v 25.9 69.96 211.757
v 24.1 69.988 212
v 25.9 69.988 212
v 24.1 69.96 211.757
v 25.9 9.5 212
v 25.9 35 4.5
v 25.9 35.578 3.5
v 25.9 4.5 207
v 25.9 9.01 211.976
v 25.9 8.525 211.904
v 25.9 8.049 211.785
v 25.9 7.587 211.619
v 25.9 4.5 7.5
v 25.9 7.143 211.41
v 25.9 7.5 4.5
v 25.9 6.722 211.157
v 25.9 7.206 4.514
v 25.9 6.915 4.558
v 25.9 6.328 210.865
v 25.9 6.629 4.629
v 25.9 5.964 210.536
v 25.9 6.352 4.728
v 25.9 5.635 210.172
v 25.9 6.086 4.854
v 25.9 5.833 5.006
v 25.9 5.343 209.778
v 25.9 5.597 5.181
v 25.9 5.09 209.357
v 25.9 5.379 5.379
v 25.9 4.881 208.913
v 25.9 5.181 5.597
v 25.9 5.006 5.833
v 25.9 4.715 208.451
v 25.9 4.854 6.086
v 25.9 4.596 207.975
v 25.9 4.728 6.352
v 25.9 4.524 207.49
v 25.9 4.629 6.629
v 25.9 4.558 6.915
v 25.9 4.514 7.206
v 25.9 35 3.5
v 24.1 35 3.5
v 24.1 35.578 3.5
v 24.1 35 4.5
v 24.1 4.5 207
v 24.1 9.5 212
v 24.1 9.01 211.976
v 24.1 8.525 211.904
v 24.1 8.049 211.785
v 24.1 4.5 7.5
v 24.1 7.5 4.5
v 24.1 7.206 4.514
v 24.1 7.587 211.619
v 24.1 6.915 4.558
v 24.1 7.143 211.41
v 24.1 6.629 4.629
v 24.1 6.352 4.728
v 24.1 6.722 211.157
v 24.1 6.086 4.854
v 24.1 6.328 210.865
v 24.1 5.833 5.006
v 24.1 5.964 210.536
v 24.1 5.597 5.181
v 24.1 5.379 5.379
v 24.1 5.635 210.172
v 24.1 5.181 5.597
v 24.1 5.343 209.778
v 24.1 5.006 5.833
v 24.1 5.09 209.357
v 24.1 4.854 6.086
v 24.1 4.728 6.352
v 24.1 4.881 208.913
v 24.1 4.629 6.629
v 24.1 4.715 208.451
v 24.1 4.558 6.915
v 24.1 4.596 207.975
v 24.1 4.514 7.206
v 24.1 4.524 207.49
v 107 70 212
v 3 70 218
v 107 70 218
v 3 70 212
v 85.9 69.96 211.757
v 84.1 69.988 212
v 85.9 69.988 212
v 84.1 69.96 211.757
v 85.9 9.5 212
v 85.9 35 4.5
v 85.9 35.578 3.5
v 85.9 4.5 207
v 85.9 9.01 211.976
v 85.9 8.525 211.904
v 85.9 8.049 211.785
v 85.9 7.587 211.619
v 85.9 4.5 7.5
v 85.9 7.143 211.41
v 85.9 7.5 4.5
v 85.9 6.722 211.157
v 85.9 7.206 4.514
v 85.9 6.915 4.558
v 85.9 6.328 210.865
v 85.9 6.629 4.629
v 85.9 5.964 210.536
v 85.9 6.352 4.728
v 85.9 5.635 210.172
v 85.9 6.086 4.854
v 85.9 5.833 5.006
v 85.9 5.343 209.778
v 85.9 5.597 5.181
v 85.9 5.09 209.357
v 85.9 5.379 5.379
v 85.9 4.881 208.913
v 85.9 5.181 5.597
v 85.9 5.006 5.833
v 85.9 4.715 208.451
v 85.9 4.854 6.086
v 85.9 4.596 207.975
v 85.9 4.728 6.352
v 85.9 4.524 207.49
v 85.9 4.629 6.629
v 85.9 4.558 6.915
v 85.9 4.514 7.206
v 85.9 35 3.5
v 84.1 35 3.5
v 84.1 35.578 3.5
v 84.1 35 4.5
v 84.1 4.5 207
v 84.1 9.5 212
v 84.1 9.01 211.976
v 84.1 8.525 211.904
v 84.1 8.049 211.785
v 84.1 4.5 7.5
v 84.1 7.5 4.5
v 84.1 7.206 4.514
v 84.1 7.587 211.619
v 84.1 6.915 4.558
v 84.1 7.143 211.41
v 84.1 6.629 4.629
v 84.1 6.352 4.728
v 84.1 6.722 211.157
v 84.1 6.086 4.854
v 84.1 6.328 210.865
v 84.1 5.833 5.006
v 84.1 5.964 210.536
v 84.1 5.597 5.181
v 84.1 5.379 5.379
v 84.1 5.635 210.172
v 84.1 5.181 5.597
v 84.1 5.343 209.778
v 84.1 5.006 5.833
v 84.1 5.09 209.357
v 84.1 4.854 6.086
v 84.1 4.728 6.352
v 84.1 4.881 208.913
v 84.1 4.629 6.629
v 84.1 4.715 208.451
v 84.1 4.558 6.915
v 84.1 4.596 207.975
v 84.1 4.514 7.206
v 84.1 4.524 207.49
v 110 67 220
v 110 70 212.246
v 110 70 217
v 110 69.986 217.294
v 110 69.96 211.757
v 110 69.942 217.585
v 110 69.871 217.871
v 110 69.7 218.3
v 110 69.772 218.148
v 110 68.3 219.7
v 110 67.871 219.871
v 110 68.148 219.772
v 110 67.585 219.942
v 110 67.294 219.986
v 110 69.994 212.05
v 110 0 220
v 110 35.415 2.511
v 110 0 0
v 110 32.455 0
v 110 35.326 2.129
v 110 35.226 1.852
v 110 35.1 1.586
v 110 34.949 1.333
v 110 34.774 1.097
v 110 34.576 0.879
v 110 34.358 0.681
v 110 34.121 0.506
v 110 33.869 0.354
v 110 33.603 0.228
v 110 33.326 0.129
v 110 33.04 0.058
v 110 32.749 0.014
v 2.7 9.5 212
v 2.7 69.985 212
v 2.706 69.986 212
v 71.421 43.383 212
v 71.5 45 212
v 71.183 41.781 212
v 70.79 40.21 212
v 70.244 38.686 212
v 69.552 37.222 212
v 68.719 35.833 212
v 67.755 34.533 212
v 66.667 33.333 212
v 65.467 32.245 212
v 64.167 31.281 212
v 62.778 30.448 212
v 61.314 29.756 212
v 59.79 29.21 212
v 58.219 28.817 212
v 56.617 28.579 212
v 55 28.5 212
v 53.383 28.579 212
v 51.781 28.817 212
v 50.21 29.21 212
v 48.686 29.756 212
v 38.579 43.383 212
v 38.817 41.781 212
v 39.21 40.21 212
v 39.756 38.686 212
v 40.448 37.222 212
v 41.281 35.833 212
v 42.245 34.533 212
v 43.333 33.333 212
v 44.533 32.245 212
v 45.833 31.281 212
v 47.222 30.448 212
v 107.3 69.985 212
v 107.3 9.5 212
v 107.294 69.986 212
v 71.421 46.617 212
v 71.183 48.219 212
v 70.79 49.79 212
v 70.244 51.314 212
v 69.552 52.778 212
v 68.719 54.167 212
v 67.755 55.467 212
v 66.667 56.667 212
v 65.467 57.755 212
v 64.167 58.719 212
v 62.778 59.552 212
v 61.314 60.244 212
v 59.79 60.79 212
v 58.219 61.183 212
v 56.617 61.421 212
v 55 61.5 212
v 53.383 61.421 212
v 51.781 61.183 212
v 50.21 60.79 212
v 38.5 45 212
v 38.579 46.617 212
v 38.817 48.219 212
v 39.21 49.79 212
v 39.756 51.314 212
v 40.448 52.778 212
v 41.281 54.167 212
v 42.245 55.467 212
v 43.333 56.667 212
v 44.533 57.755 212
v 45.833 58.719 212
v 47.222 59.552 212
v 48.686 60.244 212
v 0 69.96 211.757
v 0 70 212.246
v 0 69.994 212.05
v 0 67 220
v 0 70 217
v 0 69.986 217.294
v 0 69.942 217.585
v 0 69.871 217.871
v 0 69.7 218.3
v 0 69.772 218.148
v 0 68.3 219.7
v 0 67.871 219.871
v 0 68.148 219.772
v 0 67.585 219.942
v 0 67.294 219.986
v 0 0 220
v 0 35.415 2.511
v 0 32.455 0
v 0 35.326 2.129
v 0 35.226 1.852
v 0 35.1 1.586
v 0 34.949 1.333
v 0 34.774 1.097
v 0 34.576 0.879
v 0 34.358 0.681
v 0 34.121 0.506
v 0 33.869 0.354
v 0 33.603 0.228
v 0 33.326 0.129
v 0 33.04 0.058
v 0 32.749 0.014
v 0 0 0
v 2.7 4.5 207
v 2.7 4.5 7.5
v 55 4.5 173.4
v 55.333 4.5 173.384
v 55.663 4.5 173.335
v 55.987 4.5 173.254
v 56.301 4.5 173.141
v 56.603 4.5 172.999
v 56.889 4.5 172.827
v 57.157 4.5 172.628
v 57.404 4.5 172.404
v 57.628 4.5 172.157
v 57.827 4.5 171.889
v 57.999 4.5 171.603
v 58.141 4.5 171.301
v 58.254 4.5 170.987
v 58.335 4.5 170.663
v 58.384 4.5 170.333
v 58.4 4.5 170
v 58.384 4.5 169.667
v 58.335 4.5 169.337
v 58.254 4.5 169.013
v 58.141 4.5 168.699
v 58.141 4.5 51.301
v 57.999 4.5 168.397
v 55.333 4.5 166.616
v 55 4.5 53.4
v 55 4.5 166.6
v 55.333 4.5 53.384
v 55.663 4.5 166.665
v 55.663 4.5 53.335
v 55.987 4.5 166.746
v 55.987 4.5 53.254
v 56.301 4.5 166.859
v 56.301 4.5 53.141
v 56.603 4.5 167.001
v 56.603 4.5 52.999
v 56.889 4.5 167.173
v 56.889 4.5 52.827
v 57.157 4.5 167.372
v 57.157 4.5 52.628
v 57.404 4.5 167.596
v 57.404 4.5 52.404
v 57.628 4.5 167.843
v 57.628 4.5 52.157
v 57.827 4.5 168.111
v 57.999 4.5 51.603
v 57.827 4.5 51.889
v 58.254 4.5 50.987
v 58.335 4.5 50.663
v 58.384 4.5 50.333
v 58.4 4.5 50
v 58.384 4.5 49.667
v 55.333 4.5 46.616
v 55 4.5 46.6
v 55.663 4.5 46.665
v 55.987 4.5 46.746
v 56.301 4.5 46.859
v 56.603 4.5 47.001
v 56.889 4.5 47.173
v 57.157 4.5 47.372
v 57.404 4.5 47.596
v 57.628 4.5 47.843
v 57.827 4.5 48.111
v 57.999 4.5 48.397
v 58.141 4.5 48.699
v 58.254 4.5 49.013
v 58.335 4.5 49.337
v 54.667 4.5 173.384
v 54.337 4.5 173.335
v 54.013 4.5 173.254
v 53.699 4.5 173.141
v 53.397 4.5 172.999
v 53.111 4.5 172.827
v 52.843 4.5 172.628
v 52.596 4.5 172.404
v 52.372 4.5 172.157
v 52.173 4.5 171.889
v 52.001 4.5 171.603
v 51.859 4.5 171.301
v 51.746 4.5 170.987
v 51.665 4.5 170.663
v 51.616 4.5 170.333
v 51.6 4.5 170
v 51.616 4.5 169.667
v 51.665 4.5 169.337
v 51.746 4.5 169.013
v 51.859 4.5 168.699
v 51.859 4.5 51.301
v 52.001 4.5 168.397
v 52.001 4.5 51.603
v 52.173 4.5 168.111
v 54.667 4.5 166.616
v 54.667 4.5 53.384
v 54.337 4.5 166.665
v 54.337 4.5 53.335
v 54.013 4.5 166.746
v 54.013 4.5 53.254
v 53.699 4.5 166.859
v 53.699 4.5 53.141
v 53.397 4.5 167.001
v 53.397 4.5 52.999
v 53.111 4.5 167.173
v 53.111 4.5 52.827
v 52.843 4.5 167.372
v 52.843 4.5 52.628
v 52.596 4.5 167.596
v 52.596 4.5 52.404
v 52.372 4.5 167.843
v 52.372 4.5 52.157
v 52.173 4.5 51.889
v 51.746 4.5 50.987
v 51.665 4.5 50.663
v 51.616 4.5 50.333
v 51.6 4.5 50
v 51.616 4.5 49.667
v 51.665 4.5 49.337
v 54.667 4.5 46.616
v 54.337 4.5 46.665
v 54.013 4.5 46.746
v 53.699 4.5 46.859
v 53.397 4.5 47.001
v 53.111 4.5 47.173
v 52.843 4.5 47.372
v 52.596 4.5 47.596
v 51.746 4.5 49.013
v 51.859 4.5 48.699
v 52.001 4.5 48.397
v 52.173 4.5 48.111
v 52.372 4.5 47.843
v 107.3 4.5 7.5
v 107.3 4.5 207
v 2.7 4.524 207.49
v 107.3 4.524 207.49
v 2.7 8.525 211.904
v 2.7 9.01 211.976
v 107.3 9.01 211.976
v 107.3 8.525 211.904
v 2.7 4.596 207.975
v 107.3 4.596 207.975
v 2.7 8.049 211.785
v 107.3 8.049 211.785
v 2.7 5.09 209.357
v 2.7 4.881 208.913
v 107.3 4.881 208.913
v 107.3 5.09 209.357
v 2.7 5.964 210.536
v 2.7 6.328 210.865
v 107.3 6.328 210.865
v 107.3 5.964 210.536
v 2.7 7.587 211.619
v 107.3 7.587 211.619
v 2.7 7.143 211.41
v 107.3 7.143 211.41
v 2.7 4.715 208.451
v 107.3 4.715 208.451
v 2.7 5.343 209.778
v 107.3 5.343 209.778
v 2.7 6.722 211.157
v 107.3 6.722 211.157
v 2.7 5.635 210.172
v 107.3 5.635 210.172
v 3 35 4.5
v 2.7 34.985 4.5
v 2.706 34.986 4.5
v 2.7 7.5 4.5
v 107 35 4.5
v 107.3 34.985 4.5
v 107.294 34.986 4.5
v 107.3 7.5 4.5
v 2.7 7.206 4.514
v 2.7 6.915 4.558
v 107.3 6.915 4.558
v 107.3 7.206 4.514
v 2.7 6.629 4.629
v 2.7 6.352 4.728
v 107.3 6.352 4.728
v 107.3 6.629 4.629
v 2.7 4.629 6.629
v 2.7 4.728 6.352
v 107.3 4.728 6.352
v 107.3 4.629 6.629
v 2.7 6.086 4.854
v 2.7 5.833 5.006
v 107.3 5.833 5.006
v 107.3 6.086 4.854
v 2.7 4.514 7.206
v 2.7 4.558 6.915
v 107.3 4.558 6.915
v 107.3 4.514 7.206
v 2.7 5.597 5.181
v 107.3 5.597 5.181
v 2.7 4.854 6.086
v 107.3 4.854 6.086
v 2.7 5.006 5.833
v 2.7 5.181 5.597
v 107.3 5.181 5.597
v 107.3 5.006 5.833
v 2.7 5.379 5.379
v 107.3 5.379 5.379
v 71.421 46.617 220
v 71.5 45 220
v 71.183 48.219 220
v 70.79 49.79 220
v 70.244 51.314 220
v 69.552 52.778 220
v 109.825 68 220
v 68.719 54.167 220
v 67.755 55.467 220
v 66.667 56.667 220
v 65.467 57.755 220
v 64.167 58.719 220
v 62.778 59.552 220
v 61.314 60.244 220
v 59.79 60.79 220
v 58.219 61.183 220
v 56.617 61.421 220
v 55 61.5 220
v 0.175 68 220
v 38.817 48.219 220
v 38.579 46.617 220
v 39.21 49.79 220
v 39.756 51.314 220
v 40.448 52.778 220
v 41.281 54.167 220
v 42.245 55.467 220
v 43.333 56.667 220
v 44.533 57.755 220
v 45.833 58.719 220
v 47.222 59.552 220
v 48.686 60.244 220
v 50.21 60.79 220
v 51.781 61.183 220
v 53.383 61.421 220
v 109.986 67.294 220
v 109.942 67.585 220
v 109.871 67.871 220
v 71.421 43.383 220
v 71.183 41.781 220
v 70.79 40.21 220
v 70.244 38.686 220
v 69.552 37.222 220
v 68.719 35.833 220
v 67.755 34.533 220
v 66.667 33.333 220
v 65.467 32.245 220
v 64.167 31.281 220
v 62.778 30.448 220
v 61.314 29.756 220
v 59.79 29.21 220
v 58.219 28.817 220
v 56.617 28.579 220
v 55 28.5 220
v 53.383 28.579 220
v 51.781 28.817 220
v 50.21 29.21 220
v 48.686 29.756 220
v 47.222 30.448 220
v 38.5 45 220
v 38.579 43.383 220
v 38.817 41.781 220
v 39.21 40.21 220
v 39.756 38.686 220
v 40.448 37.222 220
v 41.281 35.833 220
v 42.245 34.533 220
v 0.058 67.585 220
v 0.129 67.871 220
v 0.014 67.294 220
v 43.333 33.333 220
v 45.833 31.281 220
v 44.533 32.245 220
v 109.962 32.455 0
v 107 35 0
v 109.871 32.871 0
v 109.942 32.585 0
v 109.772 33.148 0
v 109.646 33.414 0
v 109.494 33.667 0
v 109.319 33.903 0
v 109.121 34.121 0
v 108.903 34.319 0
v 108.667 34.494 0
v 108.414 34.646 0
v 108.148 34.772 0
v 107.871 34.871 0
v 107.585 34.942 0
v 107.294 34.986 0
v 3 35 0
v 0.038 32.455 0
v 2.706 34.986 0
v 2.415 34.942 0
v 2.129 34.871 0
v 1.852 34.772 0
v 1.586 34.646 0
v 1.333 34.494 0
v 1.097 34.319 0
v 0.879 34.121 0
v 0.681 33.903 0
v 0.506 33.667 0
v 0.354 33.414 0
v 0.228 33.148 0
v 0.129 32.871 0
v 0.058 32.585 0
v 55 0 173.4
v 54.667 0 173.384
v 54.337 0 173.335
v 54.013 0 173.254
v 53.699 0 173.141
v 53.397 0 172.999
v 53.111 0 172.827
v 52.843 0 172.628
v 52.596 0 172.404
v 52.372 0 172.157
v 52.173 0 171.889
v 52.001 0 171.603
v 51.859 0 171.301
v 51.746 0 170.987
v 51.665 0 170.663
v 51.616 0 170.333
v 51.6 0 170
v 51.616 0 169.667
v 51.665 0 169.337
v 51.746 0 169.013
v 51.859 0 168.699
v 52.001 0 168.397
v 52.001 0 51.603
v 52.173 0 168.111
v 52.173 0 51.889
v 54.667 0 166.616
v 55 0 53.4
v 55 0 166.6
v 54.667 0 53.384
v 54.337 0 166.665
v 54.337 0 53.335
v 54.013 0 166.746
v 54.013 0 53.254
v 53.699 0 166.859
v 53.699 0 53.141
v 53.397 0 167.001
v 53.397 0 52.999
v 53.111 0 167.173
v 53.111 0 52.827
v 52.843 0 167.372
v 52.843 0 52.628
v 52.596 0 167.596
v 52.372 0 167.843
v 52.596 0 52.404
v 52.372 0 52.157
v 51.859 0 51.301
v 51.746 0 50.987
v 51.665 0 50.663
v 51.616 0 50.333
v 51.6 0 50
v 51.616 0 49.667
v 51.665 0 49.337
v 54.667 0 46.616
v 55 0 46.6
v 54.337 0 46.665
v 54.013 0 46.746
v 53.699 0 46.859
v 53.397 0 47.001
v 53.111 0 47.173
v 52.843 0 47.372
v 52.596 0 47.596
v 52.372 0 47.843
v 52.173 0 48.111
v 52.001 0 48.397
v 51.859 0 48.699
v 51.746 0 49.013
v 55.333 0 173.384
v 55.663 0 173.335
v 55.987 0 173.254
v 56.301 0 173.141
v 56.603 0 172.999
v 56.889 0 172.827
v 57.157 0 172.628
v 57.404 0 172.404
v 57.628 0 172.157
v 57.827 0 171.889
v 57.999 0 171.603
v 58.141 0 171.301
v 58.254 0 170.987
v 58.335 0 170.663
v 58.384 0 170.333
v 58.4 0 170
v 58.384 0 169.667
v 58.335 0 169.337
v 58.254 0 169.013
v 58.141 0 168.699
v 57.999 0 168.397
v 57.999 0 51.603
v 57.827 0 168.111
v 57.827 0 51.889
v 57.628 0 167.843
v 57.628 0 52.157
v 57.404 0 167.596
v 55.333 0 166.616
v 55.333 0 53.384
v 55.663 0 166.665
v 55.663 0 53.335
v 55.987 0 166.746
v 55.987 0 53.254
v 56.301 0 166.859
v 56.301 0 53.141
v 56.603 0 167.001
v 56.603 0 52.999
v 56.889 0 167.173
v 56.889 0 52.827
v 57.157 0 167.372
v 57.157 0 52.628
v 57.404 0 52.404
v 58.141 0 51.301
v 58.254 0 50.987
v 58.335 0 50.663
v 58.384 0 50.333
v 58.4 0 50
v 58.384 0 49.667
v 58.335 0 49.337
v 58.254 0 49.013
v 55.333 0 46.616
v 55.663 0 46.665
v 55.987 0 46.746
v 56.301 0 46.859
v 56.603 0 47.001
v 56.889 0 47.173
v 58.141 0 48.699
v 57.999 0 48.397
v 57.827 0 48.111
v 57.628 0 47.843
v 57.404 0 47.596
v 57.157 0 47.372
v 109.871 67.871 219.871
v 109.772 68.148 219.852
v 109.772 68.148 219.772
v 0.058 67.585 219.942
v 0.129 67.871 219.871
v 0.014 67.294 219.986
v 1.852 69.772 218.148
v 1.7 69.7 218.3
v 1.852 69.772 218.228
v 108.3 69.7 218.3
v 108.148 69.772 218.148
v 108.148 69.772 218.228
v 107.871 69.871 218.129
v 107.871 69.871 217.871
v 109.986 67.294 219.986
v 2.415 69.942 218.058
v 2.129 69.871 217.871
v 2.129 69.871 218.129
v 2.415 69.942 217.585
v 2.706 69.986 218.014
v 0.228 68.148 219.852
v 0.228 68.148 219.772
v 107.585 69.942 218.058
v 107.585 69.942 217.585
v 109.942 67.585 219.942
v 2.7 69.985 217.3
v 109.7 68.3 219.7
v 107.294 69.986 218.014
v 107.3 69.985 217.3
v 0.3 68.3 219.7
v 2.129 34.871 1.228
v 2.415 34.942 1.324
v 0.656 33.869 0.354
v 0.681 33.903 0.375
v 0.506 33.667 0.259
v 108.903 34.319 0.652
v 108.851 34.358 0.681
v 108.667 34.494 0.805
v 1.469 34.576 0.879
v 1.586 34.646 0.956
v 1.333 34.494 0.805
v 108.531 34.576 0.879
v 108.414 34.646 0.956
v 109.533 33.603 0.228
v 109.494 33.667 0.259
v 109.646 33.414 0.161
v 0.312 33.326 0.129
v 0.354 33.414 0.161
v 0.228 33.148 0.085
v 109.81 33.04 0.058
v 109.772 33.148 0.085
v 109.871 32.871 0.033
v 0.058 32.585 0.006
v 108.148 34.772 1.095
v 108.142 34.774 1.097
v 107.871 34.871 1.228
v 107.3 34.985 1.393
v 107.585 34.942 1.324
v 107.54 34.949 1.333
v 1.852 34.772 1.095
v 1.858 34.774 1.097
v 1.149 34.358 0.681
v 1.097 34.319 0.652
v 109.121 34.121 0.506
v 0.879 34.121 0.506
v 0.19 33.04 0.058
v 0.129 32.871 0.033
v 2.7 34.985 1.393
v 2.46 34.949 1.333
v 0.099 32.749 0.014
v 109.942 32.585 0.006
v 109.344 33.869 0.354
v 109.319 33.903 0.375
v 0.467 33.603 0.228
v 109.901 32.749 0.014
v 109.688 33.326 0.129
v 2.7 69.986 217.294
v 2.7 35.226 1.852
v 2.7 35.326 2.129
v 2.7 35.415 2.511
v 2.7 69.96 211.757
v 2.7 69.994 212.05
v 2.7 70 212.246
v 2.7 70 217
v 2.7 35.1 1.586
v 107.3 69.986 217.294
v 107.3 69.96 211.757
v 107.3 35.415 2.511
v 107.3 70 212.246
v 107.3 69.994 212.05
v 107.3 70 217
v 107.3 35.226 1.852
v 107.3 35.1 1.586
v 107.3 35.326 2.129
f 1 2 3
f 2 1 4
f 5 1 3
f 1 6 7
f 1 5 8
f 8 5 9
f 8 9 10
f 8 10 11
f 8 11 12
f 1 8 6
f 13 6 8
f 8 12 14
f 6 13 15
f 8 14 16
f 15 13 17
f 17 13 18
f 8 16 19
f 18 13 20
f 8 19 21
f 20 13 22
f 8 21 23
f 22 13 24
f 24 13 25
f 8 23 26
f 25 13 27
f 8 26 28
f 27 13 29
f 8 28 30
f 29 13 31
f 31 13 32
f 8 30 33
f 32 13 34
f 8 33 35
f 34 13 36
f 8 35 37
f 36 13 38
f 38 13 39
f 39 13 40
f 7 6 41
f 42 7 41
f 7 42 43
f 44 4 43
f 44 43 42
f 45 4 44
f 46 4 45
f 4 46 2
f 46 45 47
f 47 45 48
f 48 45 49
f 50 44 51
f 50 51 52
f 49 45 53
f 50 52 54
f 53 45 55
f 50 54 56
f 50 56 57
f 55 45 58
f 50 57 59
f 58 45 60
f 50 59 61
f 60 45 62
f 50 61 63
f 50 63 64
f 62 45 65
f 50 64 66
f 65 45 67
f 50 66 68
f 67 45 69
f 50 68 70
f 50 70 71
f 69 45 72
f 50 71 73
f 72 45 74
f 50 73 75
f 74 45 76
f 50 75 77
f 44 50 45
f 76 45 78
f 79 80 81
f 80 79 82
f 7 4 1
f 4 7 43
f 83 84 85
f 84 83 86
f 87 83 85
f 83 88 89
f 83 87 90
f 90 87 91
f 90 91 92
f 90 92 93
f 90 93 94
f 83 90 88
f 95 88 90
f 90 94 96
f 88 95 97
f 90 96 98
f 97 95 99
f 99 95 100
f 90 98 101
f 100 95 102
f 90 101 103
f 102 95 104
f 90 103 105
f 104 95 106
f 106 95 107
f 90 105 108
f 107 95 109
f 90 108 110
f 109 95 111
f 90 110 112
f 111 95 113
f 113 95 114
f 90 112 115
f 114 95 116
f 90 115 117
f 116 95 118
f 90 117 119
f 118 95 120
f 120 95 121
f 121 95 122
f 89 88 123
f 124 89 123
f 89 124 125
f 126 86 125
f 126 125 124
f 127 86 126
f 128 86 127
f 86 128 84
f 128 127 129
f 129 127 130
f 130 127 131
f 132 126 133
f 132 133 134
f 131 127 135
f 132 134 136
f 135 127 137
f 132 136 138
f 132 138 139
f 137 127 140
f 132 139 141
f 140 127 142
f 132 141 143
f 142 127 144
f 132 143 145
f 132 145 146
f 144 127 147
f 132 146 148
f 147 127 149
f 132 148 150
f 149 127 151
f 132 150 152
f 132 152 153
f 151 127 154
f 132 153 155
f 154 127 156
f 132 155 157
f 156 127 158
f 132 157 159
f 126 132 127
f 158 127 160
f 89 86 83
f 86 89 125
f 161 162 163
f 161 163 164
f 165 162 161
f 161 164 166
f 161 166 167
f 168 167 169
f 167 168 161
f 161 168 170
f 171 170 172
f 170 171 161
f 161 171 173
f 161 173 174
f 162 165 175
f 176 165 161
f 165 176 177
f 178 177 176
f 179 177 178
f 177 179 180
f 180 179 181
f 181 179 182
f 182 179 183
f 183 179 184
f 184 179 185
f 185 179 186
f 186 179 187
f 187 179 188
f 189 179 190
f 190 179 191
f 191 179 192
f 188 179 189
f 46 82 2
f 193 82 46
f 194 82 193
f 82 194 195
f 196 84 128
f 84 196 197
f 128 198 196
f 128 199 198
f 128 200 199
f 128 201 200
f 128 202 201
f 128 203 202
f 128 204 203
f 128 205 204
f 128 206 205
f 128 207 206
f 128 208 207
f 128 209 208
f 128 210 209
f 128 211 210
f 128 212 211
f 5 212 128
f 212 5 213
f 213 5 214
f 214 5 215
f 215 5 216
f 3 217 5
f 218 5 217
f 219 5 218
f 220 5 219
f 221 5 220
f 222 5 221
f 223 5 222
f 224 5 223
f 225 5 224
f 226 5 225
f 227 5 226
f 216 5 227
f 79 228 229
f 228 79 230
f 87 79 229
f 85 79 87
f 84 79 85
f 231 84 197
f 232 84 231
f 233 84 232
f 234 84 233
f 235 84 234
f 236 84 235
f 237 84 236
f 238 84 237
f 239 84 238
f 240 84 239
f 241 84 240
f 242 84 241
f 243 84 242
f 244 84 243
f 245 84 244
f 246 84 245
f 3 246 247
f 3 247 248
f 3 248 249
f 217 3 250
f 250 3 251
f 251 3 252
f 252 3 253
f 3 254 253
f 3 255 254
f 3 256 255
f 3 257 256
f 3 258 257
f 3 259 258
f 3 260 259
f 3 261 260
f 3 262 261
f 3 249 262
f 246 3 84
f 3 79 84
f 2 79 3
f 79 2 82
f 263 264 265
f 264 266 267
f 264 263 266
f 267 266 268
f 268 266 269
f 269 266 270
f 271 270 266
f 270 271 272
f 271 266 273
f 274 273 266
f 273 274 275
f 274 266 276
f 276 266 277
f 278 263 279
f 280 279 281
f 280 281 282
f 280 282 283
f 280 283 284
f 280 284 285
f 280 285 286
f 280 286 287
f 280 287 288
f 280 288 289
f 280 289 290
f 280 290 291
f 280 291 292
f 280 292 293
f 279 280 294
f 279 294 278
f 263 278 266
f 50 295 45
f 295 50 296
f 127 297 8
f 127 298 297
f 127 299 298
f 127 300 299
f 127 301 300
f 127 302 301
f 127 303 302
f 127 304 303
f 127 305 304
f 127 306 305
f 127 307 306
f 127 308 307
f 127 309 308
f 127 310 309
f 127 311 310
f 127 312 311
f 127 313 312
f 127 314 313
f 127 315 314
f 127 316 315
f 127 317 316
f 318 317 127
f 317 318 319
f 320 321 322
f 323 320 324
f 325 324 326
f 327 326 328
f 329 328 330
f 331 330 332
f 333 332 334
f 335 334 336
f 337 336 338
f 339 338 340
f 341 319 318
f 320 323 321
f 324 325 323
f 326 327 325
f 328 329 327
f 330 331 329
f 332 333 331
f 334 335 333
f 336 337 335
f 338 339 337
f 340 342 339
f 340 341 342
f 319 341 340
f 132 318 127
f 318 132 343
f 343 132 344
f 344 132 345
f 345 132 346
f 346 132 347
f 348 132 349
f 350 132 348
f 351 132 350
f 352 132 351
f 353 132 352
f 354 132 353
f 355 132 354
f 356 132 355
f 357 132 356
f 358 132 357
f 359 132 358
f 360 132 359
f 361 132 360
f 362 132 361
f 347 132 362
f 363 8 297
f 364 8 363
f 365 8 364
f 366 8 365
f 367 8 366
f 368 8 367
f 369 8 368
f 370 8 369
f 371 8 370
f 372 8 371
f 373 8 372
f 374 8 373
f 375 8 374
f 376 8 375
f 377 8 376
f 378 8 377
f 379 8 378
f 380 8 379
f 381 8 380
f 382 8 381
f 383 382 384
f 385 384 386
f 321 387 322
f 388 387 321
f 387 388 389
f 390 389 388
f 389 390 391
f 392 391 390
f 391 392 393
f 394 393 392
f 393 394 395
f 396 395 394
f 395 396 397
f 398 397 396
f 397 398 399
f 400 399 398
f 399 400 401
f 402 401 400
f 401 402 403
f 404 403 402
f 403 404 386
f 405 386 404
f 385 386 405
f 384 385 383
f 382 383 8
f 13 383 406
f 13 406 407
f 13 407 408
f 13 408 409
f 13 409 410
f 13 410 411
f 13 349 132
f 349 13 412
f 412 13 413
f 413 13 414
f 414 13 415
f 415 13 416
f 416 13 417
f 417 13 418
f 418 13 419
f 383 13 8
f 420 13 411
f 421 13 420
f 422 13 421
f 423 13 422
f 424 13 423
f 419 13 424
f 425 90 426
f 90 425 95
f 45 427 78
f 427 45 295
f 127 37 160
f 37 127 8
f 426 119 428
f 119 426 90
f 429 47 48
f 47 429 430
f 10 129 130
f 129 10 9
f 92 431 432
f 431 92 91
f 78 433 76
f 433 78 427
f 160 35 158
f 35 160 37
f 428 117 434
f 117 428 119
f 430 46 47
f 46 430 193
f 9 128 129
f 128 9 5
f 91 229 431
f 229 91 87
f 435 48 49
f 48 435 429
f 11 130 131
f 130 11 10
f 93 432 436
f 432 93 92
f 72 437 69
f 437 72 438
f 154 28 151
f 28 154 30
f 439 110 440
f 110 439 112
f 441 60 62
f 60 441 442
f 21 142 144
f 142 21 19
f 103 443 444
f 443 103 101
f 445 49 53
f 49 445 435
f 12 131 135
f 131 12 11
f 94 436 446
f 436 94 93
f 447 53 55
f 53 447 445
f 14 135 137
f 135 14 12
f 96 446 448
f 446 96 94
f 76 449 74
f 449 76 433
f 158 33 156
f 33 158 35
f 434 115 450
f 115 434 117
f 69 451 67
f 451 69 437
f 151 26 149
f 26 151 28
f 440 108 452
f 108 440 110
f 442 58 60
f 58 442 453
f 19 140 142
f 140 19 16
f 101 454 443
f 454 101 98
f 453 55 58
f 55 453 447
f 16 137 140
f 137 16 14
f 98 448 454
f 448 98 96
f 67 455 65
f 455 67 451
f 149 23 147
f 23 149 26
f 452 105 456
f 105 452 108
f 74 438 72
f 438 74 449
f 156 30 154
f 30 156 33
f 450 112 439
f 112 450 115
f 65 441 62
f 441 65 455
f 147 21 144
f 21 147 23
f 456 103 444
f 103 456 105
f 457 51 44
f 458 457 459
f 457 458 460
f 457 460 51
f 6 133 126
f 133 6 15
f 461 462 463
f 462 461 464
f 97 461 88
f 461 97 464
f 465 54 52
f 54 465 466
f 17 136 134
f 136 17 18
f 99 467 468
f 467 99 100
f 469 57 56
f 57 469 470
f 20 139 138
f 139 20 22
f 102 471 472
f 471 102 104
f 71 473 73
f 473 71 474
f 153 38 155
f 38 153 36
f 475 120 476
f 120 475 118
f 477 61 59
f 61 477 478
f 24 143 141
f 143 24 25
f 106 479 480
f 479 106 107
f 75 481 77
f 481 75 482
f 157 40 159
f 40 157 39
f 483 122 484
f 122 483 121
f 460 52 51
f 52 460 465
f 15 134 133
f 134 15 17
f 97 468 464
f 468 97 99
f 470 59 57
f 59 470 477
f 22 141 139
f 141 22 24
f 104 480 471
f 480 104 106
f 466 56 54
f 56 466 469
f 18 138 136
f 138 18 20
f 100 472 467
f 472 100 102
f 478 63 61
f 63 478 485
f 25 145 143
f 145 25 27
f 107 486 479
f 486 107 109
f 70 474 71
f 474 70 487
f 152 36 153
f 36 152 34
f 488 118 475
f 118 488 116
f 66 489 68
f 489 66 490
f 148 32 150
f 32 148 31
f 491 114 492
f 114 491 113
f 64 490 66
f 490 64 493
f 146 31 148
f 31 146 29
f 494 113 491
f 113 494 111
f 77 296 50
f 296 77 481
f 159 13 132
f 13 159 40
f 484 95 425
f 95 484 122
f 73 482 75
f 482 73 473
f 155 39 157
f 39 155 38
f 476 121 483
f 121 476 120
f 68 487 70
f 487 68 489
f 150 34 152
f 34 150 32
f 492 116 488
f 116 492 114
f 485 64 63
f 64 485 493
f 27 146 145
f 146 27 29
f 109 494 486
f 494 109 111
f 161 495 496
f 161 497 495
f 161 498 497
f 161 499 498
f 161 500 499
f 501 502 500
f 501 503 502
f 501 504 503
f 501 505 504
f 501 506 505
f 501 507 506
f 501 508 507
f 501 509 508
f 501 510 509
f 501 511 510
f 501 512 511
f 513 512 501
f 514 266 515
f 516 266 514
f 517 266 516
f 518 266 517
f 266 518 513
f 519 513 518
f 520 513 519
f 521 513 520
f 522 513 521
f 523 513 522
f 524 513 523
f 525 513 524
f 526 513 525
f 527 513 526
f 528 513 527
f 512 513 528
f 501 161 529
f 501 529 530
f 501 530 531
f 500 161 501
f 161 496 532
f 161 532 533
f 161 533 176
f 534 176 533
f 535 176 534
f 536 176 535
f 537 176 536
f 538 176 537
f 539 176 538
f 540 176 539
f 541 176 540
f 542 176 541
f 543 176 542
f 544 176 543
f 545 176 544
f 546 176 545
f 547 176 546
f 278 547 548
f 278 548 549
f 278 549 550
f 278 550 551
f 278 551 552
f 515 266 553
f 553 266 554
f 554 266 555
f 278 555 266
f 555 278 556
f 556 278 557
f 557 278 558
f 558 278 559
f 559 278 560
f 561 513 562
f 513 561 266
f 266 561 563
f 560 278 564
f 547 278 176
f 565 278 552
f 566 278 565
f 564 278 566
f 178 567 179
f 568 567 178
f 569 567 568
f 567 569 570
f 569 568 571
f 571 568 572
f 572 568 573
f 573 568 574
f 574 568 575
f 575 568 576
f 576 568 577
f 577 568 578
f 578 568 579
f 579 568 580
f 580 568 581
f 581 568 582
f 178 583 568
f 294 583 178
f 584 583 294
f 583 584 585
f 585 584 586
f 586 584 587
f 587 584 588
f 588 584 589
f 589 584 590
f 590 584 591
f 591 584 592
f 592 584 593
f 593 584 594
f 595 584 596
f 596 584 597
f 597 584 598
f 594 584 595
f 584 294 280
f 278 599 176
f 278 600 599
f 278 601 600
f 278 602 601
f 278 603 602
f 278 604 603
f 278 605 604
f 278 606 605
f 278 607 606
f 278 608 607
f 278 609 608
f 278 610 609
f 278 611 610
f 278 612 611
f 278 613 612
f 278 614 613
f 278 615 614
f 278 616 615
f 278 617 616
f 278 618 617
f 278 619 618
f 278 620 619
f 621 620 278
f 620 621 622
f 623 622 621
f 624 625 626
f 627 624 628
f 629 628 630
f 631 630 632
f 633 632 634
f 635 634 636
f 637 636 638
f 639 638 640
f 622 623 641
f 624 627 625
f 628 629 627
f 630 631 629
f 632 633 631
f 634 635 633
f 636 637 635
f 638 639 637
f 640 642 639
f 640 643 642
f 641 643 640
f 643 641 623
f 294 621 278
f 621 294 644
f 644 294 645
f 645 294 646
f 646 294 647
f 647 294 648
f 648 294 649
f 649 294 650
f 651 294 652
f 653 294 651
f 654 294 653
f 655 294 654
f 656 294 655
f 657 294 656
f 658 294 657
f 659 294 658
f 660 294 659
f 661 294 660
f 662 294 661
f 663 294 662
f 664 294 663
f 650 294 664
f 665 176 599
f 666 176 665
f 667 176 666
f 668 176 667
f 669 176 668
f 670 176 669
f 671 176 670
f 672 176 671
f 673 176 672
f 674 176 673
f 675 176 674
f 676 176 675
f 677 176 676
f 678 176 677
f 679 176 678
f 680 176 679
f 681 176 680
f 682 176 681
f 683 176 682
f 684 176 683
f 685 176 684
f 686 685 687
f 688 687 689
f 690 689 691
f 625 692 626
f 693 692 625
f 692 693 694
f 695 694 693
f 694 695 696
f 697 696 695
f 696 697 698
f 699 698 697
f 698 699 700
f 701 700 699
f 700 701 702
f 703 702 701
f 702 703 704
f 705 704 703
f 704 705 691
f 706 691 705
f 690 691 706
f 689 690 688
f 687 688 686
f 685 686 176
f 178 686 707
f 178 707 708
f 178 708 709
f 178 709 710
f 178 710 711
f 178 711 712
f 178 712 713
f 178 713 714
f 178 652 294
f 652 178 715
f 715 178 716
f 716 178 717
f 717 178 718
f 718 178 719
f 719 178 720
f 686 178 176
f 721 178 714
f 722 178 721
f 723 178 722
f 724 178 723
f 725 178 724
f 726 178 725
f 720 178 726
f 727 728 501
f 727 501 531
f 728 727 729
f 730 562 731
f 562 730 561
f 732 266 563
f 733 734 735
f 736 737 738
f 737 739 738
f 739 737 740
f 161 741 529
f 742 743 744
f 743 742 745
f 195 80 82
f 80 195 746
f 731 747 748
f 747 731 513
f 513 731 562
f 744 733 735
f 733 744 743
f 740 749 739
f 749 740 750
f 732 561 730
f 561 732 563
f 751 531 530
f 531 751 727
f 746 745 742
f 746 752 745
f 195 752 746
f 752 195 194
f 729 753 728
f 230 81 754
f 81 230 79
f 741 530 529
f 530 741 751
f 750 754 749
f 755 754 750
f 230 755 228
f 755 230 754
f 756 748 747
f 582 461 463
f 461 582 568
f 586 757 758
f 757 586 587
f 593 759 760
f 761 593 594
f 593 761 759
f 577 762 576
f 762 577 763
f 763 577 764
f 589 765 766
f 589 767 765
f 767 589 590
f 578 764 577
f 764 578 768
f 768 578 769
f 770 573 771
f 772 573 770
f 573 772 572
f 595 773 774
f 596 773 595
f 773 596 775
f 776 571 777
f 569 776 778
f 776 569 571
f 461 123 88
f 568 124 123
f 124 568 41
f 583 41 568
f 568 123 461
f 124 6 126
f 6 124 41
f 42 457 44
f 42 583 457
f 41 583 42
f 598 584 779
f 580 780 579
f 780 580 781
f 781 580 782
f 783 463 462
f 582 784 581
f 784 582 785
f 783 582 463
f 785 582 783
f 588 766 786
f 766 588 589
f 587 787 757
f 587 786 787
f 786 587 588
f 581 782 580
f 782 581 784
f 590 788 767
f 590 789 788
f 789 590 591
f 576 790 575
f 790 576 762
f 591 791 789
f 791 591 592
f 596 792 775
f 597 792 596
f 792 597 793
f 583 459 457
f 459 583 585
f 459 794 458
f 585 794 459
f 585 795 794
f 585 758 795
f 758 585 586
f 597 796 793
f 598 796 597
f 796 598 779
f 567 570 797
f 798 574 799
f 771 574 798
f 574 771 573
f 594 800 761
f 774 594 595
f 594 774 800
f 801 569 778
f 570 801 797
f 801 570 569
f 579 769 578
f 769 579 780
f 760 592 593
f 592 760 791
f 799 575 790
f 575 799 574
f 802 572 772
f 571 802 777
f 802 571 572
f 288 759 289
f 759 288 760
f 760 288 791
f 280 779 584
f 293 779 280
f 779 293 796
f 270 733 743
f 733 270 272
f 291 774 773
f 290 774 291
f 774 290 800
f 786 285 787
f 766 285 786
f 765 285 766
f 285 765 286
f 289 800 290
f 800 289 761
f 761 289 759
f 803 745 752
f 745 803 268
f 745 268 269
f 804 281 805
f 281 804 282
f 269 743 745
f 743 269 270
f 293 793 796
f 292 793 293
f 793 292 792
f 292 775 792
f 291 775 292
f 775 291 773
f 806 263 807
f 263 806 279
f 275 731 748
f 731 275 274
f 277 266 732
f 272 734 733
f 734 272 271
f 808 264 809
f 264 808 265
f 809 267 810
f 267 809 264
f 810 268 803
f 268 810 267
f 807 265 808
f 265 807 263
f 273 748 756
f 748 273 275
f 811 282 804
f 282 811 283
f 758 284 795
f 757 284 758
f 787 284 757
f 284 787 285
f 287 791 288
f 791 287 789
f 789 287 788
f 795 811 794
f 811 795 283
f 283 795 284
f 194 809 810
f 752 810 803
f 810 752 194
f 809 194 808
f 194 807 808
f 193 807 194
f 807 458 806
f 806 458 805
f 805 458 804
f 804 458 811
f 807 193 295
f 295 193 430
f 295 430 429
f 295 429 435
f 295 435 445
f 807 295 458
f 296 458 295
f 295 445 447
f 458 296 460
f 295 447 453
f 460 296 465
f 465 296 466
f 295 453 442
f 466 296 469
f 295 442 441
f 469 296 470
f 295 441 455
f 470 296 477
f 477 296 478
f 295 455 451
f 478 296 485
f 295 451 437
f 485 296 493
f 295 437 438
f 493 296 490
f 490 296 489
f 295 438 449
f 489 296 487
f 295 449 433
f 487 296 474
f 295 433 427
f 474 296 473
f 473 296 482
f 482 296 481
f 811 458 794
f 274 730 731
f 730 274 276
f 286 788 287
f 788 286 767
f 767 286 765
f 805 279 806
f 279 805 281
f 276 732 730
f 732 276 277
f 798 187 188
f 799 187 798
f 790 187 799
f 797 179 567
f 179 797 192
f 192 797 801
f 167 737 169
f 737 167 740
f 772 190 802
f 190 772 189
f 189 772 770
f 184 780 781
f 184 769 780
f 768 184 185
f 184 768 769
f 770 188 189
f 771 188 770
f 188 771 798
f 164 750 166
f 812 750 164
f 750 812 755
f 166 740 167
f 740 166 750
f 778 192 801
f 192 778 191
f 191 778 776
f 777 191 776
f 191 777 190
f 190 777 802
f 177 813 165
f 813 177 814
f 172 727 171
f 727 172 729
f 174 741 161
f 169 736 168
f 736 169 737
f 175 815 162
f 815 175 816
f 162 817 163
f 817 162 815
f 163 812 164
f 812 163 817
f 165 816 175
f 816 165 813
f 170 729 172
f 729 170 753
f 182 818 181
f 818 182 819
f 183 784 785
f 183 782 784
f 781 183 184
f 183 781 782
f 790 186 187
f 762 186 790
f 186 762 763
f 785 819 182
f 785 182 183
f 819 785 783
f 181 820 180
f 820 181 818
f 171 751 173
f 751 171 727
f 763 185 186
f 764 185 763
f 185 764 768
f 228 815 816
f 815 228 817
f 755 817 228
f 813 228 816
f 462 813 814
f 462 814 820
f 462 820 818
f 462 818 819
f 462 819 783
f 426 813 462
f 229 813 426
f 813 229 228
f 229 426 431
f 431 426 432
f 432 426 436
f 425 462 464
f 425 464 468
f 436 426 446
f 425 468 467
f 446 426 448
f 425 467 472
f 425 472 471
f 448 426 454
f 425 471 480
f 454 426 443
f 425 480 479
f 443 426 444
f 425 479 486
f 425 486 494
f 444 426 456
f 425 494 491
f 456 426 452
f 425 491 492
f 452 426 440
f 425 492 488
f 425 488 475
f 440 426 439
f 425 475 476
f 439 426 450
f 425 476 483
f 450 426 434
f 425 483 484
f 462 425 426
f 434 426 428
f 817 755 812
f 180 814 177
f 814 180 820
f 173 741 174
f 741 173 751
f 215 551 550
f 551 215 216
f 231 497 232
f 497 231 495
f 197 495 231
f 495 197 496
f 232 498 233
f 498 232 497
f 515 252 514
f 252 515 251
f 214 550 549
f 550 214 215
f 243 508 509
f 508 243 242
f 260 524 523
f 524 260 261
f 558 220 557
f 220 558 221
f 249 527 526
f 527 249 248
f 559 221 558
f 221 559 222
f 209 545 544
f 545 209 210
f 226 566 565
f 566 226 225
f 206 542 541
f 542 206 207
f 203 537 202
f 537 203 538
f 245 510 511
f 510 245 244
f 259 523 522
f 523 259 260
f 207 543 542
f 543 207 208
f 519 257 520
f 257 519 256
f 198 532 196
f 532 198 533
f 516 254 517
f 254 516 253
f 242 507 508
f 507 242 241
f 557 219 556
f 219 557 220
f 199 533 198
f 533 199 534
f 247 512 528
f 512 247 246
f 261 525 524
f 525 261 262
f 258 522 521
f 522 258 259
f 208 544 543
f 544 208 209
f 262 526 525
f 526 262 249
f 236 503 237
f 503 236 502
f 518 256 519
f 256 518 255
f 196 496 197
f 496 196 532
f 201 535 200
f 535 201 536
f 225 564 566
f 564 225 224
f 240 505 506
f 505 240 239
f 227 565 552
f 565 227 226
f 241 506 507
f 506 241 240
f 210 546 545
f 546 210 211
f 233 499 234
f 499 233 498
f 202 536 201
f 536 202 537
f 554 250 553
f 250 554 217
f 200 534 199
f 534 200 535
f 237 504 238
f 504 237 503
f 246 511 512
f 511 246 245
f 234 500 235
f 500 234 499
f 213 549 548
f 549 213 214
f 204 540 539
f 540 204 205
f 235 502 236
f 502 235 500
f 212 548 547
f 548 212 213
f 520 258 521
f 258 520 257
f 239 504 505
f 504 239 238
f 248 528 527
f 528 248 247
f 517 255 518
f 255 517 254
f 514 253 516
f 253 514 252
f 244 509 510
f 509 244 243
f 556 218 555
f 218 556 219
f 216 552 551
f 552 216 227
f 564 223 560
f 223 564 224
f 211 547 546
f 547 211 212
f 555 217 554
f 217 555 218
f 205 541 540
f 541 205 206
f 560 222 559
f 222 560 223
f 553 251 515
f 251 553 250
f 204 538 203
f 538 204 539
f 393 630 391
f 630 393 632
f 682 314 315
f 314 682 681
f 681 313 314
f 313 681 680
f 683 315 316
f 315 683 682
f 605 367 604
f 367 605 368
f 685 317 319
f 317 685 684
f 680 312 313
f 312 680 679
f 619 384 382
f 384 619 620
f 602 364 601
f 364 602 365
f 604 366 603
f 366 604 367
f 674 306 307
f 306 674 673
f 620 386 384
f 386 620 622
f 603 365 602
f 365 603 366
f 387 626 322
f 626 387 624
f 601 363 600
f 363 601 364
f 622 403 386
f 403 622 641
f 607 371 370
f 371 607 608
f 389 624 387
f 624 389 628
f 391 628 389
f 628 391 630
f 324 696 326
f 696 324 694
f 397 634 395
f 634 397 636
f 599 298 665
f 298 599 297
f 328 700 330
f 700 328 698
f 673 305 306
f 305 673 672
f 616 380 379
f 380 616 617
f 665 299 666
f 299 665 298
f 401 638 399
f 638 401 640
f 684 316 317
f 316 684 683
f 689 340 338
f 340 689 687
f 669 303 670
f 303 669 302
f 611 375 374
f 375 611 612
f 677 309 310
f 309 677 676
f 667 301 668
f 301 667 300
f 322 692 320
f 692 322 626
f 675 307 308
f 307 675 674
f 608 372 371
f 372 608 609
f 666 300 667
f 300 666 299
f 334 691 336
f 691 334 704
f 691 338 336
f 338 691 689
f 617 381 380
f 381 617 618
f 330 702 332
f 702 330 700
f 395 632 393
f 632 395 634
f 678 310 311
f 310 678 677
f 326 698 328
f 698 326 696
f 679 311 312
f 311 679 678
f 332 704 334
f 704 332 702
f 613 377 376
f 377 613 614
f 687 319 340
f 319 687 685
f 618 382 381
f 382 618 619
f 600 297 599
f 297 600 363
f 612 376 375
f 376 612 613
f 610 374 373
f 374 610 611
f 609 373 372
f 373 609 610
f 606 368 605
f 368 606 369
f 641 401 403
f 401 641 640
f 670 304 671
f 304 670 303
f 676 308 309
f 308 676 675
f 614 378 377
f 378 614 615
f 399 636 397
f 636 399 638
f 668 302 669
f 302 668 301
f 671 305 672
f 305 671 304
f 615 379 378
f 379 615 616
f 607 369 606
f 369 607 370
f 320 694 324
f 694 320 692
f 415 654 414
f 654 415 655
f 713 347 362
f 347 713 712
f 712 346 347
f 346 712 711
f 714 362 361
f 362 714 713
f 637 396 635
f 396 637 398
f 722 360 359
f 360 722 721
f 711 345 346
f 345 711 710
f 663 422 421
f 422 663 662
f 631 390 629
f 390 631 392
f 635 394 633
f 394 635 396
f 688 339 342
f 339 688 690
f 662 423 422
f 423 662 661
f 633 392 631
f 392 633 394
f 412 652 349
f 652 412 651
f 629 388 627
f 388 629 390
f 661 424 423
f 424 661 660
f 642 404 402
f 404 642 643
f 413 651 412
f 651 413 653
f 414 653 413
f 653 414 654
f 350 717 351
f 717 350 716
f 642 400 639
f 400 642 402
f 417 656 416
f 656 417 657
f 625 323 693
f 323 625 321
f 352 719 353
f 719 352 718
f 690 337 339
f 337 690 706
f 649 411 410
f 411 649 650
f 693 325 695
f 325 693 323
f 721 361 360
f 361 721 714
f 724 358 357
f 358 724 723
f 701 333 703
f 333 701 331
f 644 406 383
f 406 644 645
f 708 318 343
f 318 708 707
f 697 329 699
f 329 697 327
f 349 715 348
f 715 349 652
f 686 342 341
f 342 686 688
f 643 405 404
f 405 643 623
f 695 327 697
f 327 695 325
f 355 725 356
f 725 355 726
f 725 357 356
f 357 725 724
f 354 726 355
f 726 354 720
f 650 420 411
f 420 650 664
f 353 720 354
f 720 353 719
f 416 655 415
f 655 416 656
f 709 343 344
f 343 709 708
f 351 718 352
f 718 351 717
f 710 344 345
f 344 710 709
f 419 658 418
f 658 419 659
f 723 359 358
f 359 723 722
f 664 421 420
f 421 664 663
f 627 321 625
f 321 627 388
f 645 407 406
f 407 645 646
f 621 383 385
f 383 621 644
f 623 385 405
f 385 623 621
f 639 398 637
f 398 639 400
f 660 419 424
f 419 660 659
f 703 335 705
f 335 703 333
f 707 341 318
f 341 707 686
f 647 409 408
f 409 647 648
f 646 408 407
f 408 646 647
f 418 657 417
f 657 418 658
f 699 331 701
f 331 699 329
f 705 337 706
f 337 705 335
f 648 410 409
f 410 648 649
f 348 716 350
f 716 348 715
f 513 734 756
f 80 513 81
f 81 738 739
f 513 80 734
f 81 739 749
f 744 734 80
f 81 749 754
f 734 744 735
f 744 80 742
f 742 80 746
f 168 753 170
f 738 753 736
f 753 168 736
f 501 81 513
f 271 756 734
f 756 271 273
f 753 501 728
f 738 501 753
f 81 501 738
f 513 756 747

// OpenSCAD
// === DESCRIPTION ===
// Wall mount bracket for Breha hand pump (camp trailer hand sink pump)
// https://camec.com.au/products/breha-hand-pump-std-white
//
// Design: Triangulated L-bracket with two side walls and open front
// - Back plate mounts to wall via M6 through-bolts
// - Top shelf holds pump via 32mm mounting hole
// - Triangulated side walls with diagonal bracing for rigidity
// - Interior ribs add stiffness without blocking pump body
// - Pipe enters from below through open bracket cavity
// - Chamfered shelf edges for hand safety
// - Rounded vertical corners on shelf and bottom plate

// === PRINT SETTINGS ===
// Printer: Bambu Lab X1 Carbon (256 x 256 x 256 mm)
// Material: PETG (dry filament first: 60-65C for 4-6 hours)
// Layer Height: 0.2mm
// Walls/Perimeters: 6 (2.7mm minimum wall sections)
// Infill: 25% gyroid
// Supports: None required (all overhangs self-supporting)
// Orientation: Print on LEFT SIDE WALL (flat on build plate)
//   -> In slicer: right-click model > "Place on face" > click left side wall
//   -> Print dims: X=70mm (depth), Y=220mm (height), Z=110mm (width)
//   -> Pumping forces align with XY layer plane = maximum strength
// Nozzle temp: 240-245C (max layer adhesion for structural part)
// Bed temp: 75-80C
// Fan: 30-40% (standard PETG, do NOT use 100%)
// Bed adhesion: Apply glue stick on PEI as PETG release agent
// Estimated material: ~150-200g
// Notes:
//   - VERIFY pump body fits through the mounting hole before final print
//   - Print a short 20mm-tall test piece first to check bolt hole sizing
//   - Two wall bolts strongly recommended for rigidity under pumping loads
//   - Pipe/hose enters from below through open bracket cavity
//   - Sand any sharp edges after printing for hand comfort

// === PARAMETERS ===

// -- Printer --
nozzle_diameter = 0.4;
layer_height    = 0.2;

// -- Bracket envelope (mounted orientation: X=width, Y=depth, Z=height) --
bracket_height = 220;   // [mm] Vertical height when wall-mounted
bracket_width  = 110;   // [mm] Horizontal width
bracket_depth  = 70;    // [mm] Extends this far from wall

// -- Structural wall thicknesses --
// Thicknesses are multiples of extrusion width (0.45mm for 0.4mm nozzle)
back_wall   = 4.5;  // [mm] Back plate: 10 perimeters (bolt bearing surface)
side_wall   = 2.7;  // [mm] Side walls: 6 perimeters (structural)
shelf_thick = 8.0;  // [mm] Top shelf: pump mounting platform
bottom_thick = 4.5; // [mm] Bottom plate: same as back wall

// -- Bottom plate (partial, for base rigidity) --
bottom_depth = 35;   // [mm] How far bottom plate extends from wall

// -- Pump mounting hole --
pump_hole_d           = 33;   // [mm] 32mm nominal + 1mm clearance (VERIFY!)
pump_center_from_wall = 45;   // [mm] Center of hole from wall (moved back 5mm)
pump_center_x         = bracket_width / 2;  // [mm] Centered on width

// -- Wall mounting bolts (M6 through metal wall) --
bolt_hole_d = 6.8;   // [mm] M6 clearance hole (6mm + 0.8mm PETG tolerance)
bolt_1_z    = bracket_height - 50;  // [mm] Primary bolt: 50mm from top
bolt_2_z    = 50;                    // [mm] Secondary bolt: 50mm from bottom
bolt_x      = bracket_width / 2;    // [mm] Centered on width

// -- Interior reinforcement ribs --
rib_thick     = 1.8;        // [mm] 4 perimeters (prints as solid wall)
rib_positions = [25, 85];   // [mm] X positions (centred, 60mm gap preserved)

// -- Aesthetics and stress relief --
ext_round = 3;       // [mm] External corner rounding on side profile
corner_r  = 3;       // [mm] Rounding radius for vertical corners (shelf/bottom plate)
fillet_r  = 5;       // [mm] Structural fillet at shelf-to-backplate junction
fillet_r_bottom = 3; // [mm] Fillet at bottom-plate-to-backplate junction
edge_chamfer = 2;    // [mm] Chamfer on exposed shelf edges for hand safety

// === DERIVED CONSTANTS ===
extrusion_width = nozzle_diameter * 1.125;  // 0.45mm
fudge = 0.01;
$fn = $preview ? 32 : 64;

// Computed values
shelf_bottom_z = bracket_height - shelf_thick;
diagonal_run   = bracket_depth - bottom_depth;
diagonal_rise  = shelf_bottom_z;

// === MODULES ===

// Cube with rounded vertical (Z-axis) edges
module rounded_cube(size, r) {
    linear_extrude(height = size[2])
        offset(r = r) offset(delta = -r)
            square([size[0], size[1]]);
}

// 2D side profile (pentagon: back plate + diagonal + shelf)
// Coordinates: X = depth from wall, Y = height
// All convex corners rounded with ext_round radius
module side_profile() {
    offset(r = ext_round) offset(delta = -ext_round)
        polygon([
            [0, 0],                       // bottom-back
            [bottom_depth, 0],            // bottom-front (base of diagonal)
            [bracket_depth, shelf_bottom_z], // under shelf at front
            [bracket_depth, bracket_height], // top-front (shelf top)
            [0, bracket_height]           // top-back
        ]);
}

// 2D interior profile for ribs
// Intersection of side profile with interior region
module interior_profile() {
    intersection() {
        side_profile();
        // Interior region: inset from structural walls with 1mm overlap
        // for solid union with surrounding structure
        translate([back_wall - 1, bottom_thick - 1])
            square([
                bracket_depth - back_wall + 2,
                bracket_height - shelf_thick - bottom_thick + 2
            ]);
    }
}

// Quarter-cylinder fillet for a concave 90-degree interior corner
// Flat faces point in local +Y and +Z directions
// Runs along X axis for 'len'
module corner_fillet(r, len) {
    difference() {
        cube([len, r, r]);
        translate([-fudge, r, r])
            rotate([0, 90, 0])
                cylinder(h = len + 2 * fudge, r = r);
    }
}

// === MAIN BRACKET ===
module bracket() {
    difference() {
        union() {
            // ---- Primary structure ----

            // Back plate (mounts against wall)
            cube([bracket_width, back_wall, bracket_height]);

            // Top shelf (pump mounting surface) — rounded vertical corners
            translate([0, 0, shelf_bottom_z])
                rounded_cube([bracket_width, bracket_depth, shelf_thick], corner_r);

            // Bottom plate (partial depth, for base rigidity) — rounded vertical corners
            rounded_cube([bracket_width, bottom_depth, bottom_thick], corner_r);

            // Left side wall (triangulated profile)
            rotate([90, 0, 90])
                linear_extrude(height = side_wall)
                    side_profile();

            // Right side wall (triangulated profile)
            translate([bracket_width - side_wall, 0, 0])
                rotate([90, 0, 90])
                    linear_extrude(height = side_wall)
                        side_profile();

            // ---- Interior reinforcement ribs ----
            for (rx = rib_positions) {
                translate([rx - rib_thick / 2, 0, 0])
                    rotate([90, 0, 90])
                        linear_extrude(height = rib_thick)
                            interior_profile();
            }

            // ---- Structural fillets (stress relief) ----

            // Fillet: shelf underside to back plate inner surface
            // (Critical: resists moment from pumping forces)
            translate([0, back_wall, shelf_bottom_z])
                mirror([0, 0, 1])
                    corner_fillet(fillet_r, bracket_width);

            // Fillet: bottom plate top to back plate inner surface
            translate([0, back_wall, bottom_thick])
                corner_fillet(fillet_r_bottom, bracket_width);
        }

        // ---- Subtractions ----

        // Pump mounting hole through shelf
        translate([pump_center_x, pump_center_from_wall,
                   shelf_bottom_z - fudge])
            cylinder(h = shelf_thick + 2 * fudge, d = pump_hole_d);

        // Wall bolt hole 1: primary (50mm from top)
        translate([bolt_x, -fudge, bolt_1_z])
            rotate([-90, 0, 0])
                cylinder(h = back_wall + 2 * fudge, d = bolt_hole_d);

        // Wall bolt hole 2: secondary (50mm from bottom)
        translate([bolt_x, -fudge, bolt_2_z])
            rotate([-90, 0, 0])
                cylinder(h = back_wall + 2 * fudge, d = bolt_hole_d);

        // Shelf edge chamfer: 45-degree chamfer on front-top edge (hand safety)
        // Rotated cube centered on the edge cuts equal amounts from top and front
        translate([bracket_width / 2, bracket_depth, bracket_height])
            rotate([45, 0, 0])
                cube([bracket_width + 2 * fudge,
                      edge_chamfer * sqrt(2),
                      edge_chamfer * sqrt(2)], center = true);
    }
}

// === RENDER ===
bracket();
